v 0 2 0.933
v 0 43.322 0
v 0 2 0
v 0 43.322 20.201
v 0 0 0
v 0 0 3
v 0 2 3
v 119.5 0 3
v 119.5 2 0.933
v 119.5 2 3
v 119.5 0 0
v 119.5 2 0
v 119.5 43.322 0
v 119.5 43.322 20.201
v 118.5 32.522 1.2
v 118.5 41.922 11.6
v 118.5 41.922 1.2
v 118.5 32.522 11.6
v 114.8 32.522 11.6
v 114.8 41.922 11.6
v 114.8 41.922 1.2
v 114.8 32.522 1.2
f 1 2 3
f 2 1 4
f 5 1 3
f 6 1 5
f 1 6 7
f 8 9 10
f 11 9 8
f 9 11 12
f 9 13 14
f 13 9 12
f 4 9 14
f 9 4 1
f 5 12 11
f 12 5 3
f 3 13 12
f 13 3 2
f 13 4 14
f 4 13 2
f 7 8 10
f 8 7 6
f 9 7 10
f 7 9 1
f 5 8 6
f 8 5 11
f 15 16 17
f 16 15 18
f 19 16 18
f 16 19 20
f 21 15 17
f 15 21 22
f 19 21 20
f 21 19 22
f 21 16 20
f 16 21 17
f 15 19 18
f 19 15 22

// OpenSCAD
// Terraforming Mars: Ares Expedition
// Phase card holder

// Size
card_size = 47.7;
width_factor = 2.5;

// Extra fudge allowance around to add to the width of cards
tolerance = 0.1;

// Number of degrees by which to tilt the holder upwards
tilt = 25; // [0:90]

// Width of the bottom lip that holds the phase card
lip_width = 2;

// Height of the bottom lip that holds the phase card
lip_height = 3;

peg = false;
peg_hole = false;
peg_tolerance = 0.125;

peg_width = 5;
peg_height = 4;
peg_depth = 3;
peg_radius = 3;

test_pegs = false;

// 9.3 x 3.6 magnets
magnet_left = false;
magnet_right = true;
magnet_width = 3.7;
magnet_height = 9.4;
magnet_depth = 10.4;
magnet_back_margin = 1.4;
magnet_side_margin = 1;
magnet_z_margin = 1.2;
//magnet_tolerance = 0.1;

card = card_size + tolerance;
width = card * width_factor;
back_shift = (card / sin(90)) * sin(90 - tilt);

// Base holder for the phase card
module base () {
    
    difference () {
        // Holder cube
        rotate([tilt, 0, 0])
            translate([0, 0, -card])
                cube([width, card, card]);
        
        // Exclude everything below z=0
        translate([-width * 5, -card * 5, -card * 10])
            cube([width * 10, card * 10, card * 10]);
        
        // Exclude back
        // Trig to cut off the back
        // https://www.mathsisfun.com/algebra/trig-solving-asa-triangles.html
        translate([0, back_shift, 0])
            cube([width, card, card]);
    }
    
    // Lip
    cube([width, lip_width, lip_height]);
}

module peg () {
    translate([width, back_shift / 2, 0])
        cube([peg_width, peg_height, peg_depth]);
    
    translate([
        width + peg_width,
        (back_shift / 2) + (peg_height / 2),
    0])
        cylinder(peg_depth, peg_radius, peg_radius);
}

module peg_hole () {
    translate([-card, 0, 0]) {
        translate([
            card,
            (back_shift / 2) - (peg_tolerance / 2),
            0
        ])
            cube([
                peg_width + peg_tolerance,
                peg_height + peg_tolerance,
                peg_depth
            ]);
    
    translate([
        card + peg_width - (peg_tolerance /2),
        (back_shift / 2) + (peg_height / 2),
        0
    ])
        cylinder(
            peg_depth,
            peg_radius + peg_tolerance,
            peg_radius + peg_tolerance
        );
    }
}

module magnet_hole_left () {
    // Hole
    translate([
        magnet_side_margin,
        back_shift - magnet_height - magnet_back_margin,
        magnet_z_margin
    ])
        cube([magnet_width, magnet_height, magnet_depth]);
}

module magnet_hole_right () {
    translate([
        width - magnet_width - (magnet_side_margin * 2),
        0,
        0
    ])
        magnet_hole_left();
}


// Main
module main () {
    difference () {
        base();
        if (peg_hole)
            peg_hole();
        
        if (magnet_left) {
            magnet_hole_left();
        }
        if (magnet_right) {
            magnet_hole_right();
        }
    }
        
    if (peg)
        peg();
    
// Peg tolerance testing
//    if (peg && peg_hole) {
//        difference () {
//            peg_hole();
//            peg();
//        }
//    }
}

// Run main

if (!test_pegs) {
    main();
}

// Test pegs
if (test_pegs) {
    difference () {
        main();
        
        // Cull front
        cube([card, 17, card]);

        // Cull back
        translate([0, 30, 0])
            cube([card, card, card]);
        
        // Cull top
        translate([0, 0, 5])
            cube([card, card, card]);
        
        // Cull middle
        translate([12, 0, 0])
            cube([card - 20, card, card]);
    }
}
